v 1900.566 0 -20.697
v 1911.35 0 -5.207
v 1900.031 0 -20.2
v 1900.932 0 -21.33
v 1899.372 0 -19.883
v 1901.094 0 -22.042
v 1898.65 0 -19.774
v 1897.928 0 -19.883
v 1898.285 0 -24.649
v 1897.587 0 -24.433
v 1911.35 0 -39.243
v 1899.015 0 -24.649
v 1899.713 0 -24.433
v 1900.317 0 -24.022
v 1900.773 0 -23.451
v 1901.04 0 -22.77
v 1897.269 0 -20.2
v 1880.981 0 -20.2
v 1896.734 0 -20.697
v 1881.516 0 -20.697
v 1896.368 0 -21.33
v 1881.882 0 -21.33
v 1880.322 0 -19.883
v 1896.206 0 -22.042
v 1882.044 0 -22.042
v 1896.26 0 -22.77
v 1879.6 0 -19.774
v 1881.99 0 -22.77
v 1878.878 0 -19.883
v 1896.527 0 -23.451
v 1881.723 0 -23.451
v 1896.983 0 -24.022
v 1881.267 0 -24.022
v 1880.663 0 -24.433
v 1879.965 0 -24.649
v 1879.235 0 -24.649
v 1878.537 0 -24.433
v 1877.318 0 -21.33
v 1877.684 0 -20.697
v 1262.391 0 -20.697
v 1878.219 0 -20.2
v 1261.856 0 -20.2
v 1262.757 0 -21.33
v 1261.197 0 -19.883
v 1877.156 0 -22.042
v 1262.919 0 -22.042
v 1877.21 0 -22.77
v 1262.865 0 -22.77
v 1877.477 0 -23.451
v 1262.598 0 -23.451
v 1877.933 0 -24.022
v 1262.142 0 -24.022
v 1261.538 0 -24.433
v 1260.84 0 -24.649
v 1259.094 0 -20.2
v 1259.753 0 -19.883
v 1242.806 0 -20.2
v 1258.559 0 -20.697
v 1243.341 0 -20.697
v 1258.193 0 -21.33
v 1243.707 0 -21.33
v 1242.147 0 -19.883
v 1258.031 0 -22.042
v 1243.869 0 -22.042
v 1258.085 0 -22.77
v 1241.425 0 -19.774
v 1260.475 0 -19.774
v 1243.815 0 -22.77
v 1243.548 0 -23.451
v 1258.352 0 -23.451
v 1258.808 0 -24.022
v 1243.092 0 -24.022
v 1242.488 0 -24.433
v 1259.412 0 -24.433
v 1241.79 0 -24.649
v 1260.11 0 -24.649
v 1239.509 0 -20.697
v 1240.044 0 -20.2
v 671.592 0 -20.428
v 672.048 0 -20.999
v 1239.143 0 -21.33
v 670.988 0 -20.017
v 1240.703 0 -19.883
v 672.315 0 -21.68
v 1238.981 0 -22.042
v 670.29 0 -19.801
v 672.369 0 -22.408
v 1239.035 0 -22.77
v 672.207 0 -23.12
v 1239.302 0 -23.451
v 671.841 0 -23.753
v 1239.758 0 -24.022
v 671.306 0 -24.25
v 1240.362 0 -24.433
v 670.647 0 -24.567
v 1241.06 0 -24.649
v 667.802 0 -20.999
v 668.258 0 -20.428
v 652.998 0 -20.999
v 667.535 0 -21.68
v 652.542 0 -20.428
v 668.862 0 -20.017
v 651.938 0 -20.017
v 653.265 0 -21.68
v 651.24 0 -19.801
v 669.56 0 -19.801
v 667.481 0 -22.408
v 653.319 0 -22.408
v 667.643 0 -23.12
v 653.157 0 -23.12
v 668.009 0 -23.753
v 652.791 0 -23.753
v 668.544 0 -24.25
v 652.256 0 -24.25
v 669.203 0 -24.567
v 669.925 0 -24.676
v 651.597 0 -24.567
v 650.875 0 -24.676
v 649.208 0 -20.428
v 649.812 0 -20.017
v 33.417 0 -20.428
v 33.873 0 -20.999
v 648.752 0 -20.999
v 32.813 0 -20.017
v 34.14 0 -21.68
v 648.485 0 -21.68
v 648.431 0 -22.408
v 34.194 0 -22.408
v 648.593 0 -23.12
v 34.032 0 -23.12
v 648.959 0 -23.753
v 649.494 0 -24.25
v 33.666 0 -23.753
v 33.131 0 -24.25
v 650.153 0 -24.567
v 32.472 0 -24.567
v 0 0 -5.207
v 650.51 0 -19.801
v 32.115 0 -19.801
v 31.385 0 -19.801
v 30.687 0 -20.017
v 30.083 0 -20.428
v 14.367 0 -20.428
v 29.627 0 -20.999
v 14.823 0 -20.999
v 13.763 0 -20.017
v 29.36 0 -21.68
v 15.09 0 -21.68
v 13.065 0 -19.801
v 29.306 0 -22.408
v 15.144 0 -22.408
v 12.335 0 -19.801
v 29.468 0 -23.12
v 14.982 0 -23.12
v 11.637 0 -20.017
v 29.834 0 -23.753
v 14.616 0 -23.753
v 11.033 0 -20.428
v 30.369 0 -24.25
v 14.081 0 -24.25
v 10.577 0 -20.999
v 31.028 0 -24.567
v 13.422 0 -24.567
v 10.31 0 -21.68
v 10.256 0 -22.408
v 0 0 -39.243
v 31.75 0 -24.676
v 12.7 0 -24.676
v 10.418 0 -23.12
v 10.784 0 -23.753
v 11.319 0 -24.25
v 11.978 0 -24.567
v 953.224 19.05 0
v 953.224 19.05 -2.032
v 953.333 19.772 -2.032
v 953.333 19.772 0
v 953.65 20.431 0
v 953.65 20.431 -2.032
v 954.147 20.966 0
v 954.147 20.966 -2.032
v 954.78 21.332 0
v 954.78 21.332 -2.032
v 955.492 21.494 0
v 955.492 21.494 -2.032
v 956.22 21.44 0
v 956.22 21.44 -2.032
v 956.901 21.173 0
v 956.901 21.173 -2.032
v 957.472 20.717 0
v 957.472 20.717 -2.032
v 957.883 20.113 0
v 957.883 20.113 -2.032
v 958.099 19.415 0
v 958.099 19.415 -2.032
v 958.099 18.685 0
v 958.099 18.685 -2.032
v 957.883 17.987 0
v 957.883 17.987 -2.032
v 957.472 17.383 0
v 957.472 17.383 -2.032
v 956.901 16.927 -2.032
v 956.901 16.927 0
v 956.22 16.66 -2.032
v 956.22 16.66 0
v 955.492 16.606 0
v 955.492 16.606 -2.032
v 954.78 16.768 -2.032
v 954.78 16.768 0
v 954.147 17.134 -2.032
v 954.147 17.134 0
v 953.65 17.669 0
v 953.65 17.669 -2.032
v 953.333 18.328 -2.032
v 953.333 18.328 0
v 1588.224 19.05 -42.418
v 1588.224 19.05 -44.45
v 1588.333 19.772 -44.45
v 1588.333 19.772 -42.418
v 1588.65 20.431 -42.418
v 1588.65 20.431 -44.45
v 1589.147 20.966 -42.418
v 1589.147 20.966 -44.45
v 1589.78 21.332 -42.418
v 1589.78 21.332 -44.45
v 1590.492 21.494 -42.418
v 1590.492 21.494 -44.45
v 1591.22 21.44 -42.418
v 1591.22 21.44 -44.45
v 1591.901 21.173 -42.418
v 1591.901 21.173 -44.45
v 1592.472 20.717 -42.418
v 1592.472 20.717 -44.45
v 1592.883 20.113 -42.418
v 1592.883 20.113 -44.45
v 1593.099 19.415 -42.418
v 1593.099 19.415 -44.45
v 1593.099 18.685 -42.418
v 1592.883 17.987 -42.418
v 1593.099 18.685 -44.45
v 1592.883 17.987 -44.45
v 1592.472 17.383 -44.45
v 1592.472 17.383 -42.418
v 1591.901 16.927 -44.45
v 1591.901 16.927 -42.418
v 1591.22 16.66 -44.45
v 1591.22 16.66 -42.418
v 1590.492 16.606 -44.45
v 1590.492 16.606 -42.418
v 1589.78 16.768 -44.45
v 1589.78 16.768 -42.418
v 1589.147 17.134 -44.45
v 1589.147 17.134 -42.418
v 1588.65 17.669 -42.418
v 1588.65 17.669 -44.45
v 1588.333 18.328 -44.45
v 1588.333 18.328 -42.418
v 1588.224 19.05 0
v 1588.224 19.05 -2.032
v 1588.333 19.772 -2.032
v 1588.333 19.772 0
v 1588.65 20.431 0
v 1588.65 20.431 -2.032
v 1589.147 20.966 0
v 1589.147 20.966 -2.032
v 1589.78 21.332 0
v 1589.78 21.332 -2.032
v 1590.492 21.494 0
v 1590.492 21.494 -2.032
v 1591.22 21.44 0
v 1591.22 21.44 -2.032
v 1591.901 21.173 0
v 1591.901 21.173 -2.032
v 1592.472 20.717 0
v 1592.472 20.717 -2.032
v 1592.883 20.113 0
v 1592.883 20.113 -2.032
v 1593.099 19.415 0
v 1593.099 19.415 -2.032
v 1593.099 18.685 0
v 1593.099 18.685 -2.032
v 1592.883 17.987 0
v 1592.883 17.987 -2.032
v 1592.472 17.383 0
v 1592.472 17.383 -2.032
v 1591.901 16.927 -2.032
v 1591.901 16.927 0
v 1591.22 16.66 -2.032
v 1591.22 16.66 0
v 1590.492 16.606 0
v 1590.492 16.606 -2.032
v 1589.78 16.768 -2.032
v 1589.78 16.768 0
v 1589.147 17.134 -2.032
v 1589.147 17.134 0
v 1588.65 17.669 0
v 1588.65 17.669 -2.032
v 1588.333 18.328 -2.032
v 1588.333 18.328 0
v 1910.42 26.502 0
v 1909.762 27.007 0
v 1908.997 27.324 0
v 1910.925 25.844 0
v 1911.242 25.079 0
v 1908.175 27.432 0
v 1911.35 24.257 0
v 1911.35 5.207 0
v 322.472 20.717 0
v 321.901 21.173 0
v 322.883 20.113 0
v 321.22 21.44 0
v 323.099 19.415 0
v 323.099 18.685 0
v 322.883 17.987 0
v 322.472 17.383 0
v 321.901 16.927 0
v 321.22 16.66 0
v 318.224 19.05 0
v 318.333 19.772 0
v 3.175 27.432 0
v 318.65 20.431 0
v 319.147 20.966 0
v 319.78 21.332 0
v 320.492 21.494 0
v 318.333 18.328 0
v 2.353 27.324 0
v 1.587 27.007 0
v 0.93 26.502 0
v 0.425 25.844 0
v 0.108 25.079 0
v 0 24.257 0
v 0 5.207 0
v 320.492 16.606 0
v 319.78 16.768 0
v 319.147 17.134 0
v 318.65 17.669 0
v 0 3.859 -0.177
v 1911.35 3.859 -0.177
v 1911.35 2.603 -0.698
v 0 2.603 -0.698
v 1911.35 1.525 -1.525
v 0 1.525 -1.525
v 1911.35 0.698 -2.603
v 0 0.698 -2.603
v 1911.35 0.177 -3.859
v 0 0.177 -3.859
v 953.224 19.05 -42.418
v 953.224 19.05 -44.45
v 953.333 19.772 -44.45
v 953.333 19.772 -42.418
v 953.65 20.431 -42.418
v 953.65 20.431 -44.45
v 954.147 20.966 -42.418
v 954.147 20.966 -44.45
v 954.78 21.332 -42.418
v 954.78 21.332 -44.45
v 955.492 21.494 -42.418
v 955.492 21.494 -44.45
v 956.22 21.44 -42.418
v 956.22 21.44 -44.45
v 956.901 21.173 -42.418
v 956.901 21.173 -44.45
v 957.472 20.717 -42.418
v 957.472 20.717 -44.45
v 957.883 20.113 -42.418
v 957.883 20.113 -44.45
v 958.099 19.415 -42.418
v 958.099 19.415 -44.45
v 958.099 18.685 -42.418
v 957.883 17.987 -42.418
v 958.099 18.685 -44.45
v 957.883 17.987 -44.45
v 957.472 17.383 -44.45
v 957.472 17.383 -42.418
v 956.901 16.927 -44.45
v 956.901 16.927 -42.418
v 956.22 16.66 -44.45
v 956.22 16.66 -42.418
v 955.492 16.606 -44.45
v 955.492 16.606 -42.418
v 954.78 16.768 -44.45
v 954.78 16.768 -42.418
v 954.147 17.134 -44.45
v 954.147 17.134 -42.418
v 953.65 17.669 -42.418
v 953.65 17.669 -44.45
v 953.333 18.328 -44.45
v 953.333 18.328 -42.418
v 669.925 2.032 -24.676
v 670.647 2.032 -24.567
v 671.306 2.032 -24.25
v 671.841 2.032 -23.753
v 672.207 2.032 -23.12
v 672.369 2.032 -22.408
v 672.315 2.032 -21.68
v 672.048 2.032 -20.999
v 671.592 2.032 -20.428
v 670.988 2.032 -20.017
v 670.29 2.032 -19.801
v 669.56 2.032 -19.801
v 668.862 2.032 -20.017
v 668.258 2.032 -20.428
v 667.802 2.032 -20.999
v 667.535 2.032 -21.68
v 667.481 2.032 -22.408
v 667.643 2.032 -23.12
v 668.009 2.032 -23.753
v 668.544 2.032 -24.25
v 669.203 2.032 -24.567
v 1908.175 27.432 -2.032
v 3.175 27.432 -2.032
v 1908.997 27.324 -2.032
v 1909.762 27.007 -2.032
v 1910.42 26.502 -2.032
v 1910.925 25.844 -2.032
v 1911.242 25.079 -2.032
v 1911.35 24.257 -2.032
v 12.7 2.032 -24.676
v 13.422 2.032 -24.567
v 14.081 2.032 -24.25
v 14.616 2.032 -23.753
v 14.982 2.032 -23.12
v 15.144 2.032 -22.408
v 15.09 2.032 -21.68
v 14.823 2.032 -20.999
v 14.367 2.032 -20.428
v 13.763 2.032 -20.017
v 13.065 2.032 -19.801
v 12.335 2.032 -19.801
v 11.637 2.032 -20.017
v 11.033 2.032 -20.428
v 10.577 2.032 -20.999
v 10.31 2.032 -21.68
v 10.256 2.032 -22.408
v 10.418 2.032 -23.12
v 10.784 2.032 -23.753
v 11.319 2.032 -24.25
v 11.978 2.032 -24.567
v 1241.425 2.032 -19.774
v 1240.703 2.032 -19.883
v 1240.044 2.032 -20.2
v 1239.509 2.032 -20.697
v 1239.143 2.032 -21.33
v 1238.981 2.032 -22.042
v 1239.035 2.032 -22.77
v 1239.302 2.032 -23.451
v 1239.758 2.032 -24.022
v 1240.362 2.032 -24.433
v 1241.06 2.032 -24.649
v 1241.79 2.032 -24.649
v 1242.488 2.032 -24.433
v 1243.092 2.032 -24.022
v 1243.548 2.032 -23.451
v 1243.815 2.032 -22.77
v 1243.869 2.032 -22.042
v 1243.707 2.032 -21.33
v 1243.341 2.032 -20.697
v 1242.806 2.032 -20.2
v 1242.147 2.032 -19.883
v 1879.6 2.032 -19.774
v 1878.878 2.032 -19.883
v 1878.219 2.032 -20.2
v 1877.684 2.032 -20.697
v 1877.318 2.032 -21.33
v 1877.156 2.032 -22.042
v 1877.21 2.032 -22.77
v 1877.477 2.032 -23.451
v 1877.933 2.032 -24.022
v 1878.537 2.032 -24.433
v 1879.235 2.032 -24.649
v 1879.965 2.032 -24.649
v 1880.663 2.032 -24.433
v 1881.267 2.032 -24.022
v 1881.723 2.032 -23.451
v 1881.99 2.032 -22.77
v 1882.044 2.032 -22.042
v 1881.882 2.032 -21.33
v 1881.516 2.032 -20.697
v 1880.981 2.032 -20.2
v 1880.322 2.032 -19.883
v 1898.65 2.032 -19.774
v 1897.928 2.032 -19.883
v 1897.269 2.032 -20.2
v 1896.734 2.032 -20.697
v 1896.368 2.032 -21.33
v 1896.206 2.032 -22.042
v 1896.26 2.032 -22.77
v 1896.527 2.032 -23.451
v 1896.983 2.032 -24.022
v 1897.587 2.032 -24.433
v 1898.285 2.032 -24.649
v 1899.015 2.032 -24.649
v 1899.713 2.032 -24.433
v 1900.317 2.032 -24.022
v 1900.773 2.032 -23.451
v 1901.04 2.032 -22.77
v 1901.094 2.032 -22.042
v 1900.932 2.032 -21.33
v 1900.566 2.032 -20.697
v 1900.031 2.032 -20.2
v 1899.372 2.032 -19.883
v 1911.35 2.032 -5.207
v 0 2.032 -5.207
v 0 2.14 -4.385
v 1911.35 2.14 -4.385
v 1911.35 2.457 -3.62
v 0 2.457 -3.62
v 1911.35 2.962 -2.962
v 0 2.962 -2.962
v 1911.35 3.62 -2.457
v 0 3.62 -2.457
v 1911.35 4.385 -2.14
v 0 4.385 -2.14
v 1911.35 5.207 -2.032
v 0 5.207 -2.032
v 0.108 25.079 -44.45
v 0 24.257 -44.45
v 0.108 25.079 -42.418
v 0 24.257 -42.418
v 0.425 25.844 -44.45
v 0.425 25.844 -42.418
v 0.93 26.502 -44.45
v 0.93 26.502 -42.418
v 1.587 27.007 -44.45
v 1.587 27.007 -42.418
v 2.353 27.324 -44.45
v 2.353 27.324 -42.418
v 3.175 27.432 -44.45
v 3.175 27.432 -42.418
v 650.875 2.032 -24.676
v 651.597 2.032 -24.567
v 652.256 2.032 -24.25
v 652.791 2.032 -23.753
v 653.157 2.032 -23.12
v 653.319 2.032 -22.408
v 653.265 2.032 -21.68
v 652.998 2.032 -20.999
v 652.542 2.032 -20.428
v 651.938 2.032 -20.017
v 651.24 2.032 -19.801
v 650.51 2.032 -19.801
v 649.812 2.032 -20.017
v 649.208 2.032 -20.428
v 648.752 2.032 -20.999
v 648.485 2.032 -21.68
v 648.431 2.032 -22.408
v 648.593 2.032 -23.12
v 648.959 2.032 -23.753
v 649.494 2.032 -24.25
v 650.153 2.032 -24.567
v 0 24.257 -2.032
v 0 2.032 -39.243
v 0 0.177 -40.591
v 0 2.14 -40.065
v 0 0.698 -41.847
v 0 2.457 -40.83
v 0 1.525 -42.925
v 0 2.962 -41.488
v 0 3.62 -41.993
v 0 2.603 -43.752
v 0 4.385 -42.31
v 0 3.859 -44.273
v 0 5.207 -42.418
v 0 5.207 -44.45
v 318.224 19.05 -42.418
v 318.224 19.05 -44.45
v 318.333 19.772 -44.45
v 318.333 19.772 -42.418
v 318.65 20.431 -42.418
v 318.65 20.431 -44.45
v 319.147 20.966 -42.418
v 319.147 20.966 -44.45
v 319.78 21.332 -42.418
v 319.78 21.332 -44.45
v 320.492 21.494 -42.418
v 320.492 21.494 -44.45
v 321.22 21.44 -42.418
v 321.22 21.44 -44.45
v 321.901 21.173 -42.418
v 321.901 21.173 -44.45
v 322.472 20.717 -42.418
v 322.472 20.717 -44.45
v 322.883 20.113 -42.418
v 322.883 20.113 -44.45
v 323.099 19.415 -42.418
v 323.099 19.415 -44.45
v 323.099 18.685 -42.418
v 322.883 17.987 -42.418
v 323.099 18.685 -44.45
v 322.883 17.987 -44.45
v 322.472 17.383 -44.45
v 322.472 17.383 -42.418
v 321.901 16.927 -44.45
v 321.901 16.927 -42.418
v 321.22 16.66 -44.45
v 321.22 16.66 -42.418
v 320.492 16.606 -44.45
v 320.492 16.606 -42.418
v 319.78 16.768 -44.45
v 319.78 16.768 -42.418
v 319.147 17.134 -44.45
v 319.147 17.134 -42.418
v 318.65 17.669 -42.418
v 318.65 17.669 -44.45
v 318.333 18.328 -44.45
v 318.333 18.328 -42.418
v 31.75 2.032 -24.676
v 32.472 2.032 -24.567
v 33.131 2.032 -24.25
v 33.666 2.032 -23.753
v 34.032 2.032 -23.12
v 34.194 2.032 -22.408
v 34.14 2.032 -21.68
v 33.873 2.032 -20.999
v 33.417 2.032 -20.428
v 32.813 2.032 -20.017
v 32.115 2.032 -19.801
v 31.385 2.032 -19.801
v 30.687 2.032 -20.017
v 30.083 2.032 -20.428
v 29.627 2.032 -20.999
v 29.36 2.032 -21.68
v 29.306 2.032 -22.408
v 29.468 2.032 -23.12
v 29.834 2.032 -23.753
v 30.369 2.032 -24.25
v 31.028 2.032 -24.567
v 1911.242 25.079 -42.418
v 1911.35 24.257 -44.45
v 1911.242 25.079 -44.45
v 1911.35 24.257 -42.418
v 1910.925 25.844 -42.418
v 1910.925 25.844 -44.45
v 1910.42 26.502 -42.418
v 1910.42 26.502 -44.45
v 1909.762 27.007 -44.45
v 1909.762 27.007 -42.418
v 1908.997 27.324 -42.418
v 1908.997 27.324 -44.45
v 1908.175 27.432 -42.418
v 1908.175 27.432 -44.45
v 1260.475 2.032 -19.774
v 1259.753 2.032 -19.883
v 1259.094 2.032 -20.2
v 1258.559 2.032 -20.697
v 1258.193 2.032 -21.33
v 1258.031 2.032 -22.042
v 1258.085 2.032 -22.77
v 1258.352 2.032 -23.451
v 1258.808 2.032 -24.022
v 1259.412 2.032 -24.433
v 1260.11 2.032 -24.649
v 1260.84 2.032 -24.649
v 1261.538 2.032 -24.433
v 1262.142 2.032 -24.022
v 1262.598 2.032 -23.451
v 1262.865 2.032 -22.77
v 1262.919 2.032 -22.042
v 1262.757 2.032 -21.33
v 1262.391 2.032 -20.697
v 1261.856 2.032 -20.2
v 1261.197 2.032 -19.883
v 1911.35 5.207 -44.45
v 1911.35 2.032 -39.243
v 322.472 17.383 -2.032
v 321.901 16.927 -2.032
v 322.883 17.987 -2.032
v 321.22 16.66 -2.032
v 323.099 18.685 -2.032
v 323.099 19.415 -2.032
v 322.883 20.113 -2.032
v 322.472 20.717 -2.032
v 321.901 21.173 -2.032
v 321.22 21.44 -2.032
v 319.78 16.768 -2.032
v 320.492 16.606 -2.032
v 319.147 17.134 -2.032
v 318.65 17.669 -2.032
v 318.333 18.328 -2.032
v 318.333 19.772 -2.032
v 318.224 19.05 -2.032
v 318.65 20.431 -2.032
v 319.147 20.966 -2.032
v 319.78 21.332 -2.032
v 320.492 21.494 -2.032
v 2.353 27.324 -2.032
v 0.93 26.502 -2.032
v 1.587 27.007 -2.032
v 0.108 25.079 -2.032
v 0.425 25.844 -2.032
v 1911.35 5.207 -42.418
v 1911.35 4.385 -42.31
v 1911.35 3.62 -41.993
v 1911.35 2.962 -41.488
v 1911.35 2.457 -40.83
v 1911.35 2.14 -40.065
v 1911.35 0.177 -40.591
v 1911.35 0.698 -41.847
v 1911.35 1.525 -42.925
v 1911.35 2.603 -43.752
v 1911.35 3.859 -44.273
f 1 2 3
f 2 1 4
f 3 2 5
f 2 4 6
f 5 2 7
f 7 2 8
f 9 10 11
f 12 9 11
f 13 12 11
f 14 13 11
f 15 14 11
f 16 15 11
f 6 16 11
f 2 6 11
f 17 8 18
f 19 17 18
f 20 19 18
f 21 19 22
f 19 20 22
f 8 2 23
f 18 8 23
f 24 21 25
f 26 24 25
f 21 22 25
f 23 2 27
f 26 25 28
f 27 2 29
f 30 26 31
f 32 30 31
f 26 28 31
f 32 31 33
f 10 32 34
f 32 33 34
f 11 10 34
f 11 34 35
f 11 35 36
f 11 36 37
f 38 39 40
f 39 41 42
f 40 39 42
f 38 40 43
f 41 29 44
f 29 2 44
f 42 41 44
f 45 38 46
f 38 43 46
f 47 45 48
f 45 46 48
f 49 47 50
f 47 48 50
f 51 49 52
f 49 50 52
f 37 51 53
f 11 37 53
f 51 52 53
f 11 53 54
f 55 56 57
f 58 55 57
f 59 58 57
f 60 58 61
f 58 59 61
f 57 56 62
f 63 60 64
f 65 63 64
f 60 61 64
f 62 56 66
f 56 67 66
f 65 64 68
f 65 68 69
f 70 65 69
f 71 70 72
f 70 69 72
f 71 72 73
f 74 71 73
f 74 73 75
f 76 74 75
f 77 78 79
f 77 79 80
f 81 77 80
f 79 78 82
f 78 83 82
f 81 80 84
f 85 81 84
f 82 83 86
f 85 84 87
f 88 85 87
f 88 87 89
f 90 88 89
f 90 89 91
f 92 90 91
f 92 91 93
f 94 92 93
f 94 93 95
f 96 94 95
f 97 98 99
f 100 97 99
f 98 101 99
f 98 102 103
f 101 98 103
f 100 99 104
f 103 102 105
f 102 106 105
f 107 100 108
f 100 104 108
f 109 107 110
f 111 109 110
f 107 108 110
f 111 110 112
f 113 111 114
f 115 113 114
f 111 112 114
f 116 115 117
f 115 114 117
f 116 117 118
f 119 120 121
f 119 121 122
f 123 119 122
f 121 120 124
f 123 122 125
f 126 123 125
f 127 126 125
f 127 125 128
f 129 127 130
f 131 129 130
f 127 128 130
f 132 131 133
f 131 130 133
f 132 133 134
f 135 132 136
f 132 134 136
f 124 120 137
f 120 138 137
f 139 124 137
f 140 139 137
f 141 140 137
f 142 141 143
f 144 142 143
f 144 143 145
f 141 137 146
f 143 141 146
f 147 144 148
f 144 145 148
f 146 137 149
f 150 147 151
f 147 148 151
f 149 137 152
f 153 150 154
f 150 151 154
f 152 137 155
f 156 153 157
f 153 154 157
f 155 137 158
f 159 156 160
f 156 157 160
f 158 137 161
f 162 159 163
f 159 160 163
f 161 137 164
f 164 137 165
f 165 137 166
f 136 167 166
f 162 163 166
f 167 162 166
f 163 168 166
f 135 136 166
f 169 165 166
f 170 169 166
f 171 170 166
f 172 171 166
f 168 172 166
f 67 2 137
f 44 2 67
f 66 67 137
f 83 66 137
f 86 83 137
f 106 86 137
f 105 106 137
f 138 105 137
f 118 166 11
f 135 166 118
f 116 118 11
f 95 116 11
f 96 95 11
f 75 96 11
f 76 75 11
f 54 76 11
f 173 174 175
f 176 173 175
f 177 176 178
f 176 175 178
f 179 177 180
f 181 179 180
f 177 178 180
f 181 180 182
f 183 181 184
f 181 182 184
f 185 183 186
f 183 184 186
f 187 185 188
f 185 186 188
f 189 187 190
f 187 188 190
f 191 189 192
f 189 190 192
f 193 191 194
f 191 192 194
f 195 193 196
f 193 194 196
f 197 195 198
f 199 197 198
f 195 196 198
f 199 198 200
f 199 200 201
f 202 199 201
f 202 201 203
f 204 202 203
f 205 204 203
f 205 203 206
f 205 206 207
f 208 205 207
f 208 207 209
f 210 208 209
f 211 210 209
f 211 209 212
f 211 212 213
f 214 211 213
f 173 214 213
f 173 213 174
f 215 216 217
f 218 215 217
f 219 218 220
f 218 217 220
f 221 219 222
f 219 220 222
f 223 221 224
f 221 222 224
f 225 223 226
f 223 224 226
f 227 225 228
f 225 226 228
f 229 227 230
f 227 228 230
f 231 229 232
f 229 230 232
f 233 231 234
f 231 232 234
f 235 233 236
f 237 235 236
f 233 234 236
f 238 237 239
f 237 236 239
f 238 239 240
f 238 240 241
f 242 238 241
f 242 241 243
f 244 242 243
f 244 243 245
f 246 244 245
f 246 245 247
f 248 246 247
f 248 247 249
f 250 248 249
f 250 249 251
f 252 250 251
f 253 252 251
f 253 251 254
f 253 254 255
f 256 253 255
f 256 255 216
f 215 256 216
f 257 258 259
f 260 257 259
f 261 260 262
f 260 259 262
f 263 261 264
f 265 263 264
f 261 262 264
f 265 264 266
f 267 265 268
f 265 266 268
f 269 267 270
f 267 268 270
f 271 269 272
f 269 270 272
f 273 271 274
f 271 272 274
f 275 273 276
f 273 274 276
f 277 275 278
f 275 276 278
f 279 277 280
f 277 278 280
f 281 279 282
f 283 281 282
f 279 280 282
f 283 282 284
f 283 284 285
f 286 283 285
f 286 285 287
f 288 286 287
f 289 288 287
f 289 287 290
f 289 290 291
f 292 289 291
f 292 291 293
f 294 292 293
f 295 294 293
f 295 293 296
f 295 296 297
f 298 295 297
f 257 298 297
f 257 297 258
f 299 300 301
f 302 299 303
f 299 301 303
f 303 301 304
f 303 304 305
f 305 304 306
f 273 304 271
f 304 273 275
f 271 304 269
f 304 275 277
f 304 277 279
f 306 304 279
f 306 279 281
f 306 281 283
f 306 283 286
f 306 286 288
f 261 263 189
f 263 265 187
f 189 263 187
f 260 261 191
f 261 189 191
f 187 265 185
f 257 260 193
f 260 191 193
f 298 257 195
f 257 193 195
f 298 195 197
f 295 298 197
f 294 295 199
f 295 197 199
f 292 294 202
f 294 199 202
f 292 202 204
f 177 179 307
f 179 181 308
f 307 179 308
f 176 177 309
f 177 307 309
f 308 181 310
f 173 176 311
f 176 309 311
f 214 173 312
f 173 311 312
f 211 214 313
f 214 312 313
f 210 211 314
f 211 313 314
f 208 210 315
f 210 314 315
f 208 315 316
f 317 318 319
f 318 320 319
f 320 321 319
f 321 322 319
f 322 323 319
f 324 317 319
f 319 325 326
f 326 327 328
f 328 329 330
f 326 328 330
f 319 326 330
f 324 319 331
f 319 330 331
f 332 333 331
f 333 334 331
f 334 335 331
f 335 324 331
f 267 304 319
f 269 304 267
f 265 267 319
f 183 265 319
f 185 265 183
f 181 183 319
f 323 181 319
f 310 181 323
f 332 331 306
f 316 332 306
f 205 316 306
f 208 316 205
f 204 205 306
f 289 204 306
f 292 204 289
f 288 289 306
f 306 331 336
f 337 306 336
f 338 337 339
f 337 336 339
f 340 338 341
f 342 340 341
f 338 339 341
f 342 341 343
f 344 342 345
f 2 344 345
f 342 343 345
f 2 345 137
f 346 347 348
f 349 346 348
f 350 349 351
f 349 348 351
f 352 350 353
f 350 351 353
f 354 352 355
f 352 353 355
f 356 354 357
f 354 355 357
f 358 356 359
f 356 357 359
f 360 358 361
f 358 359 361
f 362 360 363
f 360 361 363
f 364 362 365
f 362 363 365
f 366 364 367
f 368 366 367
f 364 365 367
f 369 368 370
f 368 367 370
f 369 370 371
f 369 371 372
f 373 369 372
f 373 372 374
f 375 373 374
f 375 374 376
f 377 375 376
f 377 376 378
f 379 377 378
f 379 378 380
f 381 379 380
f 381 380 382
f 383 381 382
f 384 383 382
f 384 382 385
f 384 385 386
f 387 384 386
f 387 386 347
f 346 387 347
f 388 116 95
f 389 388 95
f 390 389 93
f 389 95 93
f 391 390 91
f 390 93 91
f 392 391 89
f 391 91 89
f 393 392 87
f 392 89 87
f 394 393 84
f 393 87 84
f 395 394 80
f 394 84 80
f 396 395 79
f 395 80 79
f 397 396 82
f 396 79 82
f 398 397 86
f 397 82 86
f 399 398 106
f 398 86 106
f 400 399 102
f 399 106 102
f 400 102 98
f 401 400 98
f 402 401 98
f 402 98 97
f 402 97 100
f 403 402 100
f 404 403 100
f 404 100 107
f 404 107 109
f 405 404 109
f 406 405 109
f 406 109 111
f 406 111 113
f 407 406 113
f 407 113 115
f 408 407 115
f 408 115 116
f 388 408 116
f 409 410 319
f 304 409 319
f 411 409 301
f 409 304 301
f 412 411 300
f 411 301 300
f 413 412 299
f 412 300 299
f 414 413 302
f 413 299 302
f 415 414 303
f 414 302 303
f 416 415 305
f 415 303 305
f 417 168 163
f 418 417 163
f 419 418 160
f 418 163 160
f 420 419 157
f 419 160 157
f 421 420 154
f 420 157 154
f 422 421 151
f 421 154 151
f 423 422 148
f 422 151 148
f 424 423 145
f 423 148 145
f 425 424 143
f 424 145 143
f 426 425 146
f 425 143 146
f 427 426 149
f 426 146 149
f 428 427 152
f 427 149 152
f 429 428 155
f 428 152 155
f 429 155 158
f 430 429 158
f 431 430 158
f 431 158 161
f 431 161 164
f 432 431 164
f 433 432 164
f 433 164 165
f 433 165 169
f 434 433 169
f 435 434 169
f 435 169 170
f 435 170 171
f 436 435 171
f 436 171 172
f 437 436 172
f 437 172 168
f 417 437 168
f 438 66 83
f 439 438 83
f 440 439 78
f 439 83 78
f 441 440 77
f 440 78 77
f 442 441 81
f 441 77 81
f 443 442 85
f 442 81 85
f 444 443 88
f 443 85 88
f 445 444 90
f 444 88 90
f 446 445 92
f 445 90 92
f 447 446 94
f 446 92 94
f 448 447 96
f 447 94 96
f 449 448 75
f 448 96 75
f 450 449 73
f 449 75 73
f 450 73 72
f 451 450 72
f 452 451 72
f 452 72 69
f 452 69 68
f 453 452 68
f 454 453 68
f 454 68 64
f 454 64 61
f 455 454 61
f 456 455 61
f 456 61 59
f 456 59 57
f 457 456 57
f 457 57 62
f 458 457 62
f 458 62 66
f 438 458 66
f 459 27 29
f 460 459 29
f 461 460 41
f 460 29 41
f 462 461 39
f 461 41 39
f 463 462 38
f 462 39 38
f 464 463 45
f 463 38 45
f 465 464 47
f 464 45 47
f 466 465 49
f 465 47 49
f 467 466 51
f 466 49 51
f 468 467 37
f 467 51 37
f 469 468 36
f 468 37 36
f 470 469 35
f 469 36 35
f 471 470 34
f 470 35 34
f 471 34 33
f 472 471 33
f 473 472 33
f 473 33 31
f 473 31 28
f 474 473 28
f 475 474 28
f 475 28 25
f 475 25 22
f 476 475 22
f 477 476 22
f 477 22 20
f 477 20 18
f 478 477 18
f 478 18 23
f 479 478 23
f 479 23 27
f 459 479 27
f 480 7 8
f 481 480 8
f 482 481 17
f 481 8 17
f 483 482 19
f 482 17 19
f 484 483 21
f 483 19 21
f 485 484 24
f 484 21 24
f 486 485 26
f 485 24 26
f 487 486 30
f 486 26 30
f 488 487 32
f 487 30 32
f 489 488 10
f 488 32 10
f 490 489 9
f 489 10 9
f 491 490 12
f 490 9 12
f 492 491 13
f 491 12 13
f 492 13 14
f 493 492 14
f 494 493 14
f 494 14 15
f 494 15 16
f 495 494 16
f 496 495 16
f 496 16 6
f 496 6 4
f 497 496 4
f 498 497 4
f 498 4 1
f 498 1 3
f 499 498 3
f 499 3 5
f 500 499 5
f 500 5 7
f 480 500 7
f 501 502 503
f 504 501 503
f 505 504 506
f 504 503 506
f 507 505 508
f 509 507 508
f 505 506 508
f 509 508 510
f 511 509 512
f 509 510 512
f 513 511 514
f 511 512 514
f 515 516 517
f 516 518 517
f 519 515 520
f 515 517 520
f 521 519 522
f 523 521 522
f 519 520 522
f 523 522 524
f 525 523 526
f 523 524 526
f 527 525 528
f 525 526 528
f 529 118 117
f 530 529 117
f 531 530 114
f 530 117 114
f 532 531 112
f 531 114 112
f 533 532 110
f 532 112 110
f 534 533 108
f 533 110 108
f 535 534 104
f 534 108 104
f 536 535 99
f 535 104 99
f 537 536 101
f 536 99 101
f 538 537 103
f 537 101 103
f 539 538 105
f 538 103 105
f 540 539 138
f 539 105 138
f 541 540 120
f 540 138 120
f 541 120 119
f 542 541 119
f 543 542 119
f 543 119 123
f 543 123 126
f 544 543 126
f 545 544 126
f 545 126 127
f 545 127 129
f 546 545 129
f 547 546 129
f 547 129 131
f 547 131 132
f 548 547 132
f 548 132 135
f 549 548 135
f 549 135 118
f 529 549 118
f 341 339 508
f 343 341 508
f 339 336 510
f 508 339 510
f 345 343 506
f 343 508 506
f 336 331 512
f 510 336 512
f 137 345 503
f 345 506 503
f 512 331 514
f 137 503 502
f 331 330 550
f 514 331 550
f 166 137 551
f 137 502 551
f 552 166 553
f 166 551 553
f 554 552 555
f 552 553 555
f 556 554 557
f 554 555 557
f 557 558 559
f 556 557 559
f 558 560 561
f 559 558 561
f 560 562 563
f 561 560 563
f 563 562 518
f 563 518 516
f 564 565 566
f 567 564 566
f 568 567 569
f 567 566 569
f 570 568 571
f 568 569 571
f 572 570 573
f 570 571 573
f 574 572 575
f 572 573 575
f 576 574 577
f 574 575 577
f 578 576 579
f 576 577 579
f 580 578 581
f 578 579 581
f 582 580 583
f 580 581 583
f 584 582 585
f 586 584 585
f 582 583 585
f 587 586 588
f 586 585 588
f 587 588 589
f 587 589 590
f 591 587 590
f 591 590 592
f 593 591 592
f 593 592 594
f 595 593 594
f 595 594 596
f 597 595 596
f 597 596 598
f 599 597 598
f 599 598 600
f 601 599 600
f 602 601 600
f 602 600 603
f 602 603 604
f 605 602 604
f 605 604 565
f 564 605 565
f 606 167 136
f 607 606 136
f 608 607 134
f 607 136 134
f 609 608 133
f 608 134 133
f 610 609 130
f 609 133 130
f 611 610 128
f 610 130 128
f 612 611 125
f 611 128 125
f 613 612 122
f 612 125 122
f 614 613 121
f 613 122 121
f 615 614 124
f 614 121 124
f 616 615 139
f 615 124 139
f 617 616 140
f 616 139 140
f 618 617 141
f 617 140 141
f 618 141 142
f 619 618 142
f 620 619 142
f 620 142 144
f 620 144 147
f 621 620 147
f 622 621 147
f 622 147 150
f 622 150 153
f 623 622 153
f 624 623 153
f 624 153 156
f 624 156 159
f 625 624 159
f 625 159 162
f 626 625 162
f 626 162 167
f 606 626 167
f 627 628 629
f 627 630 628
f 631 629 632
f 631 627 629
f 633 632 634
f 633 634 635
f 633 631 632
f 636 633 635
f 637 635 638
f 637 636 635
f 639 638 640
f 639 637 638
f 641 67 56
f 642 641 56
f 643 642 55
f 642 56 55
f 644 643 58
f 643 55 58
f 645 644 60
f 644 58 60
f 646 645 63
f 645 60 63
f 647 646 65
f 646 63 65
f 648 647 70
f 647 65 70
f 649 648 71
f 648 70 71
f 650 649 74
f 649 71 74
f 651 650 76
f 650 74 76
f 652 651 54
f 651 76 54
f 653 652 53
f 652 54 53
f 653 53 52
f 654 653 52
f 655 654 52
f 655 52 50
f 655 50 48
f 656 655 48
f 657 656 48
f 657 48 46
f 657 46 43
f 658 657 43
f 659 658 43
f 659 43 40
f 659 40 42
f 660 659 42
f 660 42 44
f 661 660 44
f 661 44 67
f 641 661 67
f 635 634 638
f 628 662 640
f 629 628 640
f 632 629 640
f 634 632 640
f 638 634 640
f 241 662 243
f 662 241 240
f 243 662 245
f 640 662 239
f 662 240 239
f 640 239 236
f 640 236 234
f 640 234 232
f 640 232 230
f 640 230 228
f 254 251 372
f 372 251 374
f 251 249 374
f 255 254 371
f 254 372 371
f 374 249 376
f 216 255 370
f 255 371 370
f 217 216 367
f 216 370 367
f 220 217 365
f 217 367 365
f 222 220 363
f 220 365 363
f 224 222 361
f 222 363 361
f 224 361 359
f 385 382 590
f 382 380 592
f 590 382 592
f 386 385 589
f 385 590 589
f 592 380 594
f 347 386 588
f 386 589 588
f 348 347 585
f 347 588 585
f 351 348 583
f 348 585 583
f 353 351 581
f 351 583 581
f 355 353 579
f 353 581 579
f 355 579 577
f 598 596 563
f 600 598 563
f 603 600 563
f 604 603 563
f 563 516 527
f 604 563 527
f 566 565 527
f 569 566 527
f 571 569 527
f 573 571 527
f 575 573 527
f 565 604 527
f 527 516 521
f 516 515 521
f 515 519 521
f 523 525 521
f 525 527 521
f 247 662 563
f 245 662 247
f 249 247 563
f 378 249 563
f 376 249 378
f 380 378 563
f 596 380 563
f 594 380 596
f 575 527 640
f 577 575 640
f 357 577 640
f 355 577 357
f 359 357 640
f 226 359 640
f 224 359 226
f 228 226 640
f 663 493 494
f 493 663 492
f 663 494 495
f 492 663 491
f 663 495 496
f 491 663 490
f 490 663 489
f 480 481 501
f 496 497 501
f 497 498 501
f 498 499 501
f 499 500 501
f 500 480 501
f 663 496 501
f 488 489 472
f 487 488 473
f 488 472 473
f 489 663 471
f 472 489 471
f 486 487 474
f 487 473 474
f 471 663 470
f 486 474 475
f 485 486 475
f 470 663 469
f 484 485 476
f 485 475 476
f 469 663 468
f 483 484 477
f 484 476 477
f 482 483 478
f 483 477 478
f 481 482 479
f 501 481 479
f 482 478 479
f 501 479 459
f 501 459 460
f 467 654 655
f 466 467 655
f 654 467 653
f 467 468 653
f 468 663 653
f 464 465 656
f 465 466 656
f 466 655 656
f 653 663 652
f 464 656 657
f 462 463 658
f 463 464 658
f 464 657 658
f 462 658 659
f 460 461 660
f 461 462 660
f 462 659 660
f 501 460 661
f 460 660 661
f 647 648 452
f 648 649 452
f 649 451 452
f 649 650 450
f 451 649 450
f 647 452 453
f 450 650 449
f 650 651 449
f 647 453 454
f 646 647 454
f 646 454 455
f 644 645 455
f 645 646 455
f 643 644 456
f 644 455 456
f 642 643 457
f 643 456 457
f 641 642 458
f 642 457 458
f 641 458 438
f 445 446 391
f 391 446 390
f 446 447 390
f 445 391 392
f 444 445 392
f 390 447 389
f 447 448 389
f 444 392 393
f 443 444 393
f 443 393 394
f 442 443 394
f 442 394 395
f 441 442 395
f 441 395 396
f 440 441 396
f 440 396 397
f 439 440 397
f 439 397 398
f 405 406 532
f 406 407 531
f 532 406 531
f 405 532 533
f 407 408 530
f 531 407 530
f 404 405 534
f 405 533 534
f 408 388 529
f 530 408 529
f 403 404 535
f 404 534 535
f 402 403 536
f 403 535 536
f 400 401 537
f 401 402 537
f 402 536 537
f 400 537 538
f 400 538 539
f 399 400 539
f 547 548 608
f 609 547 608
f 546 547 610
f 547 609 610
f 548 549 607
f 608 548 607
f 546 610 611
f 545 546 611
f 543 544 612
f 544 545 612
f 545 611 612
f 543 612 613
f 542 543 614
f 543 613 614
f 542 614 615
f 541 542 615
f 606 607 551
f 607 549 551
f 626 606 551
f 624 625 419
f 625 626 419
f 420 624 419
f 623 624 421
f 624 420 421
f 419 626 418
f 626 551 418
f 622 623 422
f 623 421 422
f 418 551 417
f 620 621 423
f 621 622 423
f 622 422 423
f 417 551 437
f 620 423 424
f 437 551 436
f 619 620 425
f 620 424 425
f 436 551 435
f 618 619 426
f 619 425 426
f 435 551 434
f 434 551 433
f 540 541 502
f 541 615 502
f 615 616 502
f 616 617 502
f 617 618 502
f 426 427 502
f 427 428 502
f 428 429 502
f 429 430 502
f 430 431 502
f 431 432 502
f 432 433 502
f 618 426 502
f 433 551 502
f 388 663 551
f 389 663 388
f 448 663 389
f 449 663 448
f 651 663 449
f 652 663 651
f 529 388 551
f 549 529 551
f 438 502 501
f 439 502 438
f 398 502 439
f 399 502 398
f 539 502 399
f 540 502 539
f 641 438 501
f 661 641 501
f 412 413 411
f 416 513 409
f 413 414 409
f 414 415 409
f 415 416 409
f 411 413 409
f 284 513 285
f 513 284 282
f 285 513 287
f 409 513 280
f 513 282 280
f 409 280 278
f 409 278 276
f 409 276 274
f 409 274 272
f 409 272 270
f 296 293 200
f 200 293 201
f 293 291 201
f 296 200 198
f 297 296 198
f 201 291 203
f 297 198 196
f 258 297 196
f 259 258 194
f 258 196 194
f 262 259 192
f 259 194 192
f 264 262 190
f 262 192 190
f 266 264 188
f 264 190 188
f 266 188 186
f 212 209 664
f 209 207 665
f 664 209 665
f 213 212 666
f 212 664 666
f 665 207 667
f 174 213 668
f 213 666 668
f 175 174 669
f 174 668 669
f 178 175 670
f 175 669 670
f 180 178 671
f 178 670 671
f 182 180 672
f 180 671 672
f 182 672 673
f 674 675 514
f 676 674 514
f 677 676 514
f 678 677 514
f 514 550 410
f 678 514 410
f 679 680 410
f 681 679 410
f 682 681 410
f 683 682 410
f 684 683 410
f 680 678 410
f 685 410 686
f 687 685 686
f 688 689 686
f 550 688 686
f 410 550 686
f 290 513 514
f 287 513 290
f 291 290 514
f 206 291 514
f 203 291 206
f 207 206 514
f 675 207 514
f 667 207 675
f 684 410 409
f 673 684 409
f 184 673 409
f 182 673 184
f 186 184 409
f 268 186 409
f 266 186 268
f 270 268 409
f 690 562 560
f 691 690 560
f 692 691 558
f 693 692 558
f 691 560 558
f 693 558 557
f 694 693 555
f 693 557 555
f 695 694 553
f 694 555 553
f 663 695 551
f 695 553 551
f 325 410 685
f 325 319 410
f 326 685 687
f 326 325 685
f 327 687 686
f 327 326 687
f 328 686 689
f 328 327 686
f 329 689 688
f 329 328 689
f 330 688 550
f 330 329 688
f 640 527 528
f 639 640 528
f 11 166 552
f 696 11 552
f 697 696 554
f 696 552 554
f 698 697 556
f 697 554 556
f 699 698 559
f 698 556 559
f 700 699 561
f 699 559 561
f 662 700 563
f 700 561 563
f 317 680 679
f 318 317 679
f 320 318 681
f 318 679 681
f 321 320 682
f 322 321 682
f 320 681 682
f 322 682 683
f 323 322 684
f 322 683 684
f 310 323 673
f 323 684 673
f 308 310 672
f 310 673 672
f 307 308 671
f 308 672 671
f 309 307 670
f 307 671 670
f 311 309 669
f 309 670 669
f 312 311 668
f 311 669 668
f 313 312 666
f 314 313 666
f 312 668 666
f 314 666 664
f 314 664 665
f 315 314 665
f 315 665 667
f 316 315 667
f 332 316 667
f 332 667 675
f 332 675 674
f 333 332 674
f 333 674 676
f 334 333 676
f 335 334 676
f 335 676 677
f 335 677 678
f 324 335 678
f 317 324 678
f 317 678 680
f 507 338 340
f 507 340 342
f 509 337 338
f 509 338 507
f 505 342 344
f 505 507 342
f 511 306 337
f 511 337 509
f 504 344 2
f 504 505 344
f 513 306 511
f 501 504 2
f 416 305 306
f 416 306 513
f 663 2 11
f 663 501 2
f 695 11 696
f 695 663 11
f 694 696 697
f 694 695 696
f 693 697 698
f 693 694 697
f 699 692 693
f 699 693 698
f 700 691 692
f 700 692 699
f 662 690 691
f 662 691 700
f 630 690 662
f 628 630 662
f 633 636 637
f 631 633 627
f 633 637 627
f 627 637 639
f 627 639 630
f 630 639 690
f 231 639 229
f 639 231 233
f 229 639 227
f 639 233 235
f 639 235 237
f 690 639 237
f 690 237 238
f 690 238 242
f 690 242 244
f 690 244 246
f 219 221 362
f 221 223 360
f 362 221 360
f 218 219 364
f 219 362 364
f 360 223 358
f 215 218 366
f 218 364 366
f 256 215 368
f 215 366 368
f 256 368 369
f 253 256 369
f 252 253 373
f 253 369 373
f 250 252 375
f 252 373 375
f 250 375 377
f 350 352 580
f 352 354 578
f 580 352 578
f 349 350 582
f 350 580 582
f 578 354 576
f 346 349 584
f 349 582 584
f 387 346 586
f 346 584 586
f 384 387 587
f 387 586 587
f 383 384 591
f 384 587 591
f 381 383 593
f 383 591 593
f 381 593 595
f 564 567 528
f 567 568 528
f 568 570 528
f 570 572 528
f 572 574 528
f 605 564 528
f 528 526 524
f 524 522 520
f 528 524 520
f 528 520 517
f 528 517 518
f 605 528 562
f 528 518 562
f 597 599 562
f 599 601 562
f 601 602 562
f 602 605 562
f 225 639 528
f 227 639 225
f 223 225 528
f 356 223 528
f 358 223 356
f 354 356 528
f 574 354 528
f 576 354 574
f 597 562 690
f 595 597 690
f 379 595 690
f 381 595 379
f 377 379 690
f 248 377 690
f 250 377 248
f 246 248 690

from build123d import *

# Parameters (mm, degrees)
BASE_FLANGE1_DEPTH = 1911.35
SKETCH2_R          = 2.4511
CUT_EXTRUDE1_DEPTH = 1913.06358148
SKETCH3_R          = 2.4511
CUT_EXTRUDE2_DEPTH = 1913.06358148
FILLET1_R          = 3.175


# Sheet-metal steps are written as plain solids
with BuildPart() as part:
    # Sketch1 → Base-Flange1 (new body)
    with BuildSketch(Plane(origin=(0, 0, 0), x_dir=(0, 0, -1), z_dir=(1, 0, 0))):
        with BuildLine():
            Line((0, 27.432), (0, 5.207))
            ThreePointArc((0, 5.207), (1.52509499, 1.52509499), (5.207, 0))
            Line((5.207, 0), (39.243, 0))
            ThreePointArc((39.243, 0), (42.92490501, 1.52509499), (44.45, 5.207))
            Line((44.45, 5.207), (44.45, 27.432))
            Line((44.45, 27.432), (42.418, 27.432))
            Line((42.418, 27.432), (42.418, 5.207))
            ThreePointArc((42.418, 5.207), (41.48806403, 2.96193597), (39.243, 2.032))
            Line((39.243, 2.032), (5.207, 2.032))
            ThreePointArc((5.207, 2.032), (2.96193597, 2.96193597), (2.032, 5.207))
            Line((2.032, 5.207), (2.032, 27.432))
            Line((2.032, 27.432), (0, 27.432))
        make_face()
    extrude(amount=BASE_FLANGE1_DEPTH)

    # Sketch2 → Cut-Extrude1 (cut, through all)
    with BuildSketch(Plane(origin=(0, 0, 0), x_dir=(-1, 0, 0), z_dir=(0, -1, 0))):
        with Locations(Location((-12.7, 22.225, 0), (0, 0, 90))):
            Circle(SKETCH2_R)
        with Locations(Location((-31.75, 22.225, 0), (0, 0, 90))):
            Circle(SKETCH2_R)
        with Locations(Location((-650.875, 22.225, 0), (0, 0, 90))):
            Circle(SKETCH2_R)
        with Locations(Location((-669.925, 22.225, 0), (0, 0, 90))):
            Circle(SKETCH2_R)
        with Locations(Location((-1898.65, 22.225, 0), (0, 0, 270))):
            Circle(SKETCH2_R)
        with Locations(Location((-1879.6, 22.225, 0), (0, 0, 270))):
            Circle(SKETCH2_R)
        with Locations(Location((-1260.475, 22.225, 0), (0, 0, 270))):
            Circle(SKETCH2_R)
        with Locations(Location((-1241.425, 22.225, 0), (0, 0, 270))):
            Circle(SKETCH2_R)
    extrude(amount=-CUT_EXTRUDE1_DEPTH, mode=Mode.SUBTRACT)

    # Sketch3 → Cut-Extrude2 (cut, through all)
    with BuildSketch(Plane(origin=(0, 0, -44.45), x_dir=(-1, 0, 0), z_dir=(0, 0, -1))):
        with Locations((-1590.675, 19.05)):
            Circle(SKETCH3_R)
        with Locations((-955.675, 19.05)):
            Circle(SKETCH3_R)
        with Locations((-320.675, 19.05)):
            Circle(SKETCH3_R)
    extrude(amount=-CUT_EXTRUDE2_DEPTH, mode=Mode.SUBTRACT)

    # Fillet1
    fillet1_edges = [part.edges().sort_by_distance(p)[0] for p in [
        (0, 27.432, -1.016),
        (0, 27.432, -43.434),
        (1911.35, 27.432, -1.016),
        (1911.35, 27.432, -43.434),
    ]]
    fillet(fillet1_edges, radius=FILLET1_R)


solid = part.part
